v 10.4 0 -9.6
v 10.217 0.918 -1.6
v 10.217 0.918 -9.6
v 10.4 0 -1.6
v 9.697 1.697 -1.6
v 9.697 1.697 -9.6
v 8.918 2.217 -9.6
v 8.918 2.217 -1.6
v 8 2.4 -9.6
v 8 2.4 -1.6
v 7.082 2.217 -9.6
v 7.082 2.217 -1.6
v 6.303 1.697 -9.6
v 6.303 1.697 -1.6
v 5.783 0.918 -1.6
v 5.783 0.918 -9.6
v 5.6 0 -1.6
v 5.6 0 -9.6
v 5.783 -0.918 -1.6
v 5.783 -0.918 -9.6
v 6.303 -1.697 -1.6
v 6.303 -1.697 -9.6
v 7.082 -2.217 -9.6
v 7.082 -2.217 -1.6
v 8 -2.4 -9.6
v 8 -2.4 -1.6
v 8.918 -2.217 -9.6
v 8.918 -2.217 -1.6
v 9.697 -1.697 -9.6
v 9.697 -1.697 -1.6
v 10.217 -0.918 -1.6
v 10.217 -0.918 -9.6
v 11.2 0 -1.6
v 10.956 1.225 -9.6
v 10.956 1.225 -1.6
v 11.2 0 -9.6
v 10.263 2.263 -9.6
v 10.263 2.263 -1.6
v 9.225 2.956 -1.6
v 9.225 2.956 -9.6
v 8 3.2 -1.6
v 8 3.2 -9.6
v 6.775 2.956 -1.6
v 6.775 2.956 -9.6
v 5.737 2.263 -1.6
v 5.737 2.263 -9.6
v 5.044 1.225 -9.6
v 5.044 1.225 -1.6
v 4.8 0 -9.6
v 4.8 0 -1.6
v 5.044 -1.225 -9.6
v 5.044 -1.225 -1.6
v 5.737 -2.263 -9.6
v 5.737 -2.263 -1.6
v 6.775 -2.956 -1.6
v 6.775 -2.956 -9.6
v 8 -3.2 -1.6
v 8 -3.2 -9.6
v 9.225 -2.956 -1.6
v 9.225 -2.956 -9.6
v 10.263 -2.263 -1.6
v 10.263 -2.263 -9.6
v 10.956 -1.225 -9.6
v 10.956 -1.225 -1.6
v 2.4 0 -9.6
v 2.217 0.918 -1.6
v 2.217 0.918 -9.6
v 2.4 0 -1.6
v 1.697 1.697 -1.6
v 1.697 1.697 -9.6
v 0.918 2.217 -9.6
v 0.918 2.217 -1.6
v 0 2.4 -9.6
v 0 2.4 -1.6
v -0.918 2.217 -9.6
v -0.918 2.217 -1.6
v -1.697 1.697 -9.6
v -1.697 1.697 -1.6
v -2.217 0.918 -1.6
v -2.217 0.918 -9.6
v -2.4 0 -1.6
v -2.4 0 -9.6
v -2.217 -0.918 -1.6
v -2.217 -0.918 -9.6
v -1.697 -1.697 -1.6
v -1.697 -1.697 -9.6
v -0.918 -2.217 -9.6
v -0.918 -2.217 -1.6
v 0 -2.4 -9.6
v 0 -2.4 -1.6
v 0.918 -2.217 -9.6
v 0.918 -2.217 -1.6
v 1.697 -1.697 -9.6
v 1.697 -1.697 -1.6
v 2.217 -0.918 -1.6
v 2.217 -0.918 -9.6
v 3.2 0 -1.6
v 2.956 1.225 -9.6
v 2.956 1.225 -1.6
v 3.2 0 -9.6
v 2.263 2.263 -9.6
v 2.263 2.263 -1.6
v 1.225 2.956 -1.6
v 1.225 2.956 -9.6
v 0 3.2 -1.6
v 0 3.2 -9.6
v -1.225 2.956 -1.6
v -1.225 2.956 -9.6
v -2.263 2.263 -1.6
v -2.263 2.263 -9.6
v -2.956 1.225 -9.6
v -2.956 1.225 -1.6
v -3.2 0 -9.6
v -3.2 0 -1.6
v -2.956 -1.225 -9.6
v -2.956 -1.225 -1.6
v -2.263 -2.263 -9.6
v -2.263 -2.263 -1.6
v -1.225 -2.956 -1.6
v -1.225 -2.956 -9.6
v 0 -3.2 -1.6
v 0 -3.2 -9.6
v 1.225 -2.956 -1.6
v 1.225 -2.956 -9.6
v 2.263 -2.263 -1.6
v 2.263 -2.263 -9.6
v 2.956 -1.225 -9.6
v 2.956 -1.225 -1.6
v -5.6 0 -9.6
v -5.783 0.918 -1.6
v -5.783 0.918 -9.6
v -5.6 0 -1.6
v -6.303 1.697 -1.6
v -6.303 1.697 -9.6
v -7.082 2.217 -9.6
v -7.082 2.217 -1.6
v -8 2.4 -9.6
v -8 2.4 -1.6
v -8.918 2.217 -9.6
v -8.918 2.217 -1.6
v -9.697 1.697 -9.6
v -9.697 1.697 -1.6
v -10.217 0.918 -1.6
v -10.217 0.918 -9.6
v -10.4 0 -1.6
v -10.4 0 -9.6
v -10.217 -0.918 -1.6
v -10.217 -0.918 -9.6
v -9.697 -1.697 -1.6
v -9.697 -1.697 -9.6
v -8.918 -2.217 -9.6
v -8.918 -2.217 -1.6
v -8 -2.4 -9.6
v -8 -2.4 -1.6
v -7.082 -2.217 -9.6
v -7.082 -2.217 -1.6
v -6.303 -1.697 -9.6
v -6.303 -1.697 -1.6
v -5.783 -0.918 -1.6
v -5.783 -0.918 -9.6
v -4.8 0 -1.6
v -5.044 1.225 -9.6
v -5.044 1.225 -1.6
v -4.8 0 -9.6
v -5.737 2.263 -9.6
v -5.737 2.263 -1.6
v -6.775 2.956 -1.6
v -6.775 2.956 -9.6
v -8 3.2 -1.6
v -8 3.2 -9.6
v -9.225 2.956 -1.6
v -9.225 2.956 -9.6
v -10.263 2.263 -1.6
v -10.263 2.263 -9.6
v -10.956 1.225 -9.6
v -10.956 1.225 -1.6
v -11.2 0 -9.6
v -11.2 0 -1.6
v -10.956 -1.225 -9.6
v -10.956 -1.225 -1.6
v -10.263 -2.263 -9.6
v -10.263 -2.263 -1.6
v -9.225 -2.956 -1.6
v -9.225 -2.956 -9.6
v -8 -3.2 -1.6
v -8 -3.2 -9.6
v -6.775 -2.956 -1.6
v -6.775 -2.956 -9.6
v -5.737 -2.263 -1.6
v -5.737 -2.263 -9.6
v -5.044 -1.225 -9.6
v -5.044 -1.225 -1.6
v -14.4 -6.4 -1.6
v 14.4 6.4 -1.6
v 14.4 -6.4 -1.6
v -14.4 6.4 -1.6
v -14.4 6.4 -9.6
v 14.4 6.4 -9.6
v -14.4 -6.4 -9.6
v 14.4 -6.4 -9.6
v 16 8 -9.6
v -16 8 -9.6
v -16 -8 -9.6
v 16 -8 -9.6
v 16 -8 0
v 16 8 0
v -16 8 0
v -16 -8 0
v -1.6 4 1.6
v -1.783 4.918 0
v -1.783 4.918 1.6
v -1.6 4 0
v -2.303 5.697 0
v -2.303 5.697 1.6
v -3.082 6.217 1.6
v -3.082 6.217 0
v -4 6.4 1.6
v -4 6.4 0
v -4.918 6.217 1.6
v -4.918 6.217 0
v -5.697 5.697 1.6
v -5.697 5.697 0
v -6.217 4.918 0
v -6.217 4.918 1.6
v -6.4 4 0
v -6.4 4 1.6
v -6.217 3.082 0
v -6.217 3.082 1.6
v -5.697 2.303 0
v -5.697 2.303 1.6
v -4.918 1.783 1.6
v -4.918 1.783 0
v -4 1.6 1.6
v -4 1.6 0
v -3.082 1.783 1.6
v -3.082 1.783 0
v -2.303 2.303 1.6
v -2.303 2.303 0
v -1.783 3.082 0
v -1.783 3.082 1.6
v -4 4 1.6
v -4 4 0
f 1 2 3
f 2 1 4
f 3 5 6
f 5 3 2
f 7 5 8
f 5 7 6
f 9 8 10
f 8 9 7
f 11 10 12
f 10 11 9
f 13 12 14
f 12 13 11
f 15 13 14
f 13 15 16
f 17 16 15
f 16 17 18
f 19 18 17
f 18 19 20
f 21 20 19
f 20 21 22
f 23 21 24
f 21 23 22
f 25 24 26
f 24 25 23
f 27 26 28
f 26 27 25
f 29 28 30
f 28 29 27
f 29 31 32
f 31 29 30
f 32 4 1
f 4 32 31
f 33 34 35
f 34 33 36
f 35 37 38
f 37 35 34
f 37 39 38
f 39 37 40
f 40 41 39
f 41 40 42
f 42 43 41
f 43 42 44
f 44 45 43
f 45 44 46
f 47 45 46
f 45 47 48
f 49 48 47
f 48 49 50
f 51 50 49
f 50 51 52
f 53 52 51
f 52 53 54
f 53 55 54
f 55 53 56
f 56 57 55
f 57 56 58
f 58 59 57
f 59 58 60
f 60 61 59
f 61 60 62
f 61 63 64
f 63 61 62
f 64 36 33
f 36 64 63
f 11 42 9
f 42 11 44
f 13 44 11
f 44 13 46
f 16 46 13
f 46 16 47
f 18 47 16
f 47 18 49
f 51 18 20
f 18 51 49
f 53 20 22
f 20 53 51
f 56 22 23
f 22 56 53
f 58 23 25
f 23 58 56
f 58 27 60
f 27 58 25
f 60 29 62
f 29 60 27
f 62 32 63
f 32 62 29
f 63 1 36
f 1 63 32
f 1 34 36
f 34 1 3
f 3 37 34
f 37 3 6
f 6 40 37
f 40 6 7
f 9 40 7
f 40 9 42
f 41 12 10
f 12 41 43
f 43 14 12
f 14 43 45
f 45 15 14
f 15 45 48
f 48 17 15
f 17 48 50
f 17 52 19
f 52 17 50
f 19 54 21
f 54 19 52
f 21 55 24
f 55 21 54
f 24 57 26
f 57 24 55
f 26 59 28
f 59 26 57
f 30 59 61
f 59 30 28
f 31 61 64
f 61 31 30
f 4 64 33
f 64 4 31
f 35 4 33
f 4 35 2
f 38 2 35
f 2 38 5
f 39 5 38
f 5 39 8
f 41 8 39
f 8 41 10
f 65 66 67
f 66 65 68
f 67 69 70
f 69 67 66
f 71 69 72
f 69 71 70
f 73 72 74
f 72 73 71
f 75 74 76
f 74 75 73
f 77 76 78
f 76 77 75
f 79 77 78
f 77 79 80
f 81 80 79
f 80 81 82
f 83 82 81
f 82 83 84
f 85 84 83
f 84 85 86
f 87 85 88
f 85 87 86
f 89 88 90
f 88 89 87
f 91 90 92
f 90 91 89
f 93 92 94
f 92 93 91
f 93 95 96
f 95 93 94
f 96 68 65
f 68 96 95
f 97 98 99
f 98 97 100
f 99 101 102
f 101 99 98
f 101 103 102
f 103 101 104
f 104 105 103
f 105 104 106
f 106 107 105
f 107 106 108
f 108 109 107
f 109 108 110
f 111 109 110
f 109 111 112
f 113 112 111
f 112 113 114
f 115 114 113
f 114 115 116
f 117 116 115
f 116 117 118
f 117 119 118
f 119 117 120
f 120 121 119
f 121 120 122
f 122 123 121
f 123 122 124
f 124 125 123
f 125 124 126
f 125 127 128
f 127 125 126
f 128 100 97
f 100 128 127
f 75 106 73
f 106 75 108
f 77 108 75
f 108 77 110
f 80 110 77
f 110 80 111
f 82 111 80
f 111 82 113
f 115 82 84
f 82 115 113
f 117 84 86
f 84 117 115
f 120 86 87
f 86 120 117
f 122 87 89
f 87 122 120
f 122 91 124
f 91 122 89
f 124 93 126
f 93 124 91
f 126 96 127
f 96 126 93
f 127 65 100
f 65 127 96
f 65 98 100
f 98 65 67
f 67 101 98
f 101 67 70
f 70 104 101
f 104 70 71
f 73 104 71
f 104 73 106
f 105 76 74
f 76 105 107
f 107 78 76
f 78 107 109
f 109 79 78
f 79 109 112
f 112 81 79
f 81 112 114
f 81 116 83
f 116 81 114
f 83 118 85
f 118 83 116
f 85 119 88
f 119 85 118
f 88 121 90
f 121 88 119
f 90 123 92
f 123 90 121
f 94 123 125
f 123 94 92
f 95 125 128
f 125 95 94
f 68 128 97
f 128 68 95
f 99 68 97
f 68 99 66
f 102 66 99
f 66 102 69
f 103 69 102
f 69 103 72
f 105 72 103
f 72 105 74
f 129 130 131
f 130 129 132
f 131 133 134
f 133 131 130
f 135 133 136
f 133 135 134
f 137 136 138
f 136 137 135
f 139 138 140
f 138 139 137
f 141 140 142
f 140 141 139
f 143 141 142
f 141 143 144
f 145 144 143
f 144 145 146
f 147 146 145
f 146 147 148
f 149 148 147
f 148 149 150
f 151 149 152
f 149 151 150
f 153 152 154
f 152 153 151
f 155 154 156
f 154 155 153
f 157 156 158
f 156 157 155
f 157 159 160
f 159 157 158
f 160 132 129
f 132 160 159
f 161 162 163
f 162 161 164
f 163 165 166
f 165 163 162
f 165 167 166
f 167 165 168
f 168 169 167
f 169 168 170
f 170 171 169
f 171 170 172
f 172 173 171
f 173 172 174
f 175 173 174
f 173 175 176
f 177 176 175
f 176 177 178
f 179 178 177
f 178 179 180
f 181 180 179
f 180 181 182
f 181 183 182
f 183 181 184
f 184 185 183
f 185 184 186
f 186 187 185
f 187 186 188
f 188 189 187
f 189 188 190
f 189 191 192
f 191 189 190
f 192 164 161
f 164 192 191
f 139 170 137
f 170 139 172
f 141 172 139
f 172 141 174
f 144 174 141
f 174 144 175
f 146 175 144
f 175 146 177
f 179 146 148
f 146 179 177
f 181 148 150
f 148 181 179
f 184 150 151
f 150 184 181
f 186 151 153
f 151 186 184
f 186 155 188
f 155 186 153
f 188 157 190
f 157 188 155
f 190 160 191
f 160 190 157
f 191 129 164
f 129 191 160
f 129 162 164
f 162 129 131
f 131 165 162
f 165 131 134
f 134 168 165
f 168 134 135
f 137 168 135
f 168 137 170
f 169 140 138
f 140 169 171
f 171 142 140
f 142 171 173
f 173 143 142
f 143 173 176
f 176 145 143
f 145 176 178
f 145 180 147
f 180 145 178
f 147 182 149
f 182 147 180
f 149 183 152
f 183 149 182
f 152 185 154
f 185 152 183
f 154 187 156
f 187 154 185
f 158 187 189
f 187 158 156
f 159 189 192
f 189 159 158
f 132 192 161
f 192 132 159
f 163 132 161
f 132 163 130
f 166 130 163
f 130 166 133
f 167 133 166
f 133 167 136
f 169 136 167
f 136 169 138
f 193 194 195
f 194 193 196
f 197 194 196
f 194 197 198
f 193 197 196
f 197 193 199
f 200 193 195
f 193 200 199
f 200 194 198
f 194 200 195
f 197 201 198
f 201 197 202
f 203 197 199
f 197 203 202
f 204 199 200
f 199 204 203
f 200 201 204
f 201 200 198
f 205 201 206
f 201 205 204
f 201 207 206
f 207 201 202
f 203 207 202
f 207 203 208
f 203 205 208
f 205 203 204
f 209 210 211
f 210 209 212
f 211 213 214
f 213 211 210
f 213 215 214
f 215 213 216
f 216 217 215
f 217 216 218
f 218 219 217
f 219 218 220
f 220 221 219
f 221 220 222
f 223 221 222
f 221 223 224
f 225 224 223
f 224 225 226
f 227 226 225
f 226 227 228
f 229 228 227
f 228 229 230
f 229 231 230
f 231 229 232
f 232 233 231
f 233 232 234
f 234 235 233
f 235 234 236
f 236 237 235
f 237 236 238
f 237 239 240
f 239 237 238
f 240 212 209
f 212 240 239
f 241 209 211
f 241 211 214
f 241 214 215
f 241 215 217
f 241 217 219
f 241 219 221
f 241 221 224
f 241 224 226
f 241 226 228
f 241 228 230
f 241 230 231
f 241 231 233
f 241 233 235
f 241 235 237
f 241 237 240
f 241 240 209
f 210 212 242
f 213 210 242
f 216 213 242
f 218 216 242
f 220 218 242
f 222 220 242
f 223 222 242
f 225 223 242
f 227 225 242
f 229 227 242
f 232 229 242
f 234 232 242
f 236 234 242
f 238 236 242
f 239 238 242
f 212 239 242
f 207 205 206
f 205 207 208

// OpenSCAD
// file: ../p/4-4ring3.scad
use <../lib.scad>
$fa=1; $fs=0.2;
function ldraw_lib__4_4ring3(realsolid=false) = [
// 0 Ring  3 x 1.0
// 0 Name: 4-4ring3.dat
// 0 Author: James Jessiman
// 0 !LDRAW_ORG Primitive UPDATE 2009-01
// 0 !LICENSE Licensed under CC BY 2.0 and CC BY 4.0 : see CAreadme.txt
// 
// 0 BFC CERTIFY CCW
  [0,"BFC","CERTIFY"],
  [0,"BFC","CCW"],
// 
// 0 !HISTORY 1998-12-15 [PTadmin] Official Update 1998-10
// 0 !HISTORY 2002-04-05 [hafhead] Added BFC statement
// 0 !HISTORY 2002-04-25 [PTadmin] Official Update 2002-02
// 0 !HISTORY 2007-06-24 [PTadmin] Header formatted for Contributor Agreement
// 0 !HISTORY 2008-07-01 [PTadmin] Official Update 2008-01
// 0 !HISTORY 2008-08-26 [cwdee] Switch polygon winding and rename
// 0 !HISTORY 2009-05-02 [PTadmin] Official Update 2009-01
// 
// 
// 4 16 -1.5308 0 3.6956 -1.1481 0 2.7717 0 0 3 0 0 4
  [4,16,-1.5308,0,3.6956,-1.1481,0,2.7717,0,0,3,0,0,4],
// 4 16 -2.8284 0 2.8284 -2.1213 0 2.1213 -1.1481 0 2.7717 -1.5308 0 3.6956
  [4,16,-2.8284,0,2.8284,-2.1213,0,2.1213,-1.1481,0,2.7717,-1.5308,0,3.6956],
// 4 16 -3.6956 0 1.5308 -2.7717 0 1.1481 -2.1213 0 2.1213 -2.8284 0 2.8284
  [4,16,-3.6956,0,1.5308,-2.7717,0,1.1481,-2.1213,0,2.1213,-2.8284,0,2.8284],
// 4 16 -4 0 0 -3 0 0 -2.7717 0 1.1481 -3.6956 0 1.5308
  [4,16,-4,0,0,-3,0,0,-2.7717,0,1.1481,-3.6956,0,1.5308],
// 4 16 -3.6956 0 -1.5308 -2.7717 0 -1.1481 -3 0 0 -4 0 0
  [4,16,-3.6956,0,-1.5308,-2.7717,0,-1.1481,-3,0,0,-4,0,0],
// 4 16 -2.8284 0 -2.8284 -2.1213 0 -2.1213 -2.7717 0 -1.1481 -3.6956 0 -1.5308
  [4,16,-2.8284,0,-2.8284,-2.1213,0,-2.1213,-2.7717,0,-1.1481,-3.6956,0,-1.5308],
// 4 16 -1.5308 0 -3.6956 -1.1481 0 -2.7717 -2.1213 0 -2.1213 -2.8284 0 -2.8284
  [4,16,-1.5308,0,-3.6956,-1.1481,0,-2.7717,-2.1213,0,-2.1213,-2.8284,0,-2.8284],
// 4 16 0 0 -4 0 0 -3 -1.1481 0 -2.7717 -1.5308 0 -3.6956
  [4,16,0,0,-4,0,0,-3,-1.1481,0,-2.7717,-1.5308,0,-3.6956],
// 4 16 1.5308 0 -3.6956 1.1481 0 -2.7717 0 0 -3 0 0 -4
  [4,16,1.5308,0,-3.6956,1.1481,0,-2.7717,0,0,-3,0,0,-4],
// 4 16 2.8284 0 -2.8284 2.1213 0 -2.1213 1.1481 0 -2.7717 1.5308 0 -3.6956
  [4,16,2.8284,0,-2.8284,2.1213,0,-2.1213,1.1481,0,-2.7717,1.5308,0,-3.6956],
// 4 16 3.6956 0 -1.5308 2.7717 0 -1.1481 2.1213 0 -2.1213 2.8284 0 -2.8284
  [4,16,3.6956,0,-1.5308,2.7717,0,-1.1481,2.1213,0,-2.1213,2.8284,0,-2.8284],
// 4 16 4 0 0 3 0 0 2.7717 0 -1.1481 3.6956 0 -1.5308
  [4,16,4,0,0,3,0,0,2.7717,0,-1.1481,3.6956,0,-1.5308],
// 4 16 3.6956 0 1.5308 2.7717 0 1.1481 3 0 0 4 0 0
  [4,16,3.6956,0,1.5308,2.7717,0,1.1481,3,0,0,4,0,0],
// 4 16 2.8284 0 2.8284 2.1213 0 2.1213 2.7717 0 1.1481 3.6956 0 1.5308
  [4,16,2.8284,0,2.8284,2.1213,0,2.1213,2.7717,0,1.1481,3.6956,0,1.5308],
// 4 16 1.5308 0 3.6956 1.1481 0 2.7717 2.1213 0 2.1213 2.8284 0 2.8284
  [4,16,1.5308,0,3.6956,1.1481,0,2.7717,2.1213,0,2.1213,2.8284,0,2.8284],
// 4 16 0 0 4 0 0 3 1.1481 0 2.7717 1.5308 0 3.6956
  [4,16,0,0,4,0,0,3,1.1481,0,2.7717,1.5308,0,3.6956],
// 0
];
module ldraw_lib__4_4ring3(step=0, col=false, unit=2/5, alt=false, line=0.2, solid=!$preview)
    makepoly(ldraw_lib__4_4ring3(solid), step=step, col=col, unit=unit, alt=alt, line=line, solid=solid);
ldraw_lib__4_4ring3(line=0.2);
// file: ../p/4-4edge.scad
use <../lib.scad>
function ldraw_lib__4_4edge() = [
// 0 Circle 1.0
// 0 Name: 4-4edge.dat
// 0 Author: James Jessiman
// 0 !LDRAW_ORG Primitive UPDATE 2017-01
// 0 !LICENSE Licensed under CC BY 2.0 and CC BY 4.0 : see CAreadme.txt
// 
// 0 BFC CERTIFY CCW
  [0,"BFC","CERTIFY"],
  [0,"BFC","CCW"],
// 
// 0 !HISTORY 1998-12-15 [PTadmin] Official Update 1998-10
// 0 !HISTORY 2005-12-28 [PTadmin] Official Update 2005-01
// 0 !HISTORY 2007-06-24 [PTadmin] Header formatted for Contributor Agreement
// 0 !HISTORY 2008-07-01 [PTadmin] Official Update 2008-01
// 0 !HISTORY 2017-01-15 [Steffen] BFCed
// 0 !HISTORY 2017-12-30 [PTadmin] Official Update 2017-01
// 
// 
// 2 24 1 0 0 0.9239 0 0.3827
  [2,24,1,0,0,0.9239,0,0.3827],
// 2 24 0.9239 0 0.3827 0.7071 0 0.7071
  [2,24,0.9239,0,0.3827,0.7071,0,0.7071],
// 2 24 0.7071 0 0.7071 0.3827 0 0.9239
  [2,24,0.7071,0,0.7071,0.3827,0,0.9239],
// 2 24 0.3827 0 0.9239 0 0 1
  [2,24,0.3827,0,0.9239,0,0,1],
// 2 24 0 0 1 -0.3827 0 0.9239
  [2,24,0,0,1,-0.3827,0,0.9239],
// 2 24 -0.3827 0 0.9239 -0.7071 0 0.7071
  [2,24,-0.3827,0,0.9239,-0.7071,0,0.7071],
// 2 24 -0.7071 0 0.7071 -0.9239 0 0.3827
  [2,24,-0.7071,0,0.7071,-0.9239,0,0.3827],
// 2 24 -0.9239 0 0.3827 -1 0 -0
  [2,24,-0.9239,0,0.3827,-1,0,-0],
// 2 24 -1 0 -0 -0.9239 0 -0.3827
  [2,24,-1,0,-0,-0.9239,0,-0.3827],
// 2 24 -0.9239 0 -0.3827 -0.7071 0 -0.7071
  [2,24,-0.9239,0,-0.3827,-0.7071,0,-0.7071],
// 2 24 -0.7071 0 -0.7071 -0.3827 0 -0.9239
  [2,24,-0.7071,0,-0.7071,-0.3827,0,-0.9239],
// 2 24 -0.3827 0 -0.9239 0 0 -1
  [2,24,-0.3827,0,-0.9239,0,0,-1],
// 2 24 0 0 -1 0.3827 0 -0.9239
  [2,24,0,0,-1,0.3827,0,-0.9239],
// 2 24 0.3827 0 -0.9239 0.7071 0 -0.7071
  [2,24,0.3827,0,-0.9239,0.7071,0,-0.7071],
// 2 24 0.7071 0 -0.7071 0.9239 0 -0.3827
  [2,24,0.7071,0,-0.7071,0.9239,0,-0.3827],
// 2 24 0.9239 0 -0.3827 1 0 0
  [2,24,0.9239,0,-0.3827,1,0,0],
];
module ldraw_lib__4_4edge(step=0, col=false, unit=2/5, alt=false, line=0.2, solid=!$preview)
    makepoly(ldraw_lib__4_4edge(), step=step, col=col, unit=unit, alt=alt, line=line, solid=solid);
ldraw_lib__4_4edge(line=0.2);
// file: ../p/4-4disc.scad
use <../lib.scad>
function ldraw_lib__4_4disc() = [
// 0 Disc 1.0
// 0 Name: 4-4disc.dat
// 0 Author: James Jessiman
// 0 !LDRAW_ORG Primitive UPDATE 2002-02
// 0 !LICENSE Licensed under CC BY 2.0 and CC BY 4.0 : see CAreadme.txt
// 
// 0 BFC CERTIFY CCW
  [0,"BFC","CERTIFY"],
  [0,"BFC","CCW"],
// 
// 0 !HISTORY 1998-12-15 [PTadmin] Official Update 1998-10
// 0 !HISTORY 2002-03-23 [sbliss] Added BFC statement
// 0 !HISTORY 2002-04-25 [PTadmin] Official Update 2002-02
// 0 !HISTORY 2007-06-24 [PTadmin] Header formatted for Contributor Agreement
// 0 !HISTORY 2008-07-01 [PTadmin] Official Update 2008-01
// 
// 
// 3 16 0 0 0 1 0 0 0.9239 0 0.3827
  [3,16,0,0,0,1,0,0,0.9239,0,0.3827],
// 3 16 0 0 0 0.9239 0 0.3827 0.7071 0 0.7071
  [3,16,0,0,0,0.9239,0,0.3827,0.7071,0,0.7071],
// 3 16 0 0 0 0.7071 0 0.7071 0.3827 0 0.9239
  [3,16,0,0,0,0.7071,0,0.7071,0.3827,0,0.9239],
// 3 16 0 0 0 0.3827 0 0.9239 0 0 1
  [3,16,0,0,0,0.3827,0,0.9239,0,0,1],
// 3 16 0 0 0 0 0 1 -0.3827 0 0.9239
  [3,16,0,0,0,0,0,1,-0.3827,0,0.9239],
// 3 16 0 0 0 -0.3827 0 0.9239 -0.7071 0 0.7071
  [3,16,0,0,0,-0.3827,0,0.9239,-0.7071,0,0.7071],
// 3 16 0 0 0 -0.7071 0 0.7071 -0.9239 0 0.3827
  [3,16,0,0,0,-0.7071,0,0.7071,-0.9239,0,0.3827],
// 3 16 0 0 0 -0.9239 0 0.3827 -1 0 -0
  [3,16,0,0,0,-0.9239,0,0.3827,-1,0,-0],
// 3 16 0 0 0 -1 0 -0 -0.9239 0 -0.3827
  [3,16,0,0,0,-1,0,-0,-0.9239,0,-0.3827],
// 3 16 0 0 0 -0.9239 0 -0.3827 -0.7071 0 -0.7071
  [3,16,0,0,0,-0.9239,0,-0.3827,-0.7071,0,-0.7071],
// 3 16 0 0 0 -0.7071 0 -0.7071 -0.3827 0 -0.9239
  [3,16,0,0,0,-0.7071,0,-0.7071,-0.3827,0,-0.9239],
// 3 16 0 0 0 -0.3827 0 -0.9239 0 0 -1
  [3,16,0,0,0,-0.3827,0,-0.9239,0,0,-1],
// 3 16 0 0 0 0 0 -1 0.3827 0 -0.9239
  [3,16,0,0,0,0,0,-1,0.3827,0,-0.9239],
// 3 16 0 0 0 0.3827 0 -0.9239 0.7071 0 -0.7071
  [3,16,0,0,0,0.3827,0,-0.9239,0.7071,0,-0.7071],
// 3 16 0 0 0 0.7071 0 -0.7071 0.9239 0 -0.3827
  [3,16,0,0,0,0.7071,0,-0.7071,0.9239,0,-0.3827],
// 3 16 0 0 0 0.9239 0 -0.3827 1 0 0
  [3,16,0,0,0,0.9239,0,-0.3827,1,0,0],
// 0
];
module ldraw_lib__4_4disc(step=0, col=false, unit=2/5, alt=false, line=0.2, solid=!$preview)
    makepoly(ldraw_lib__4_4disc(), step=step, col=col, unit=unit, alt=alt, line=line, solid=solid);
ldraw_lib__4_4disc(line=0.2);
// file: ../p/4-4cyli.scad
use <../lib.scad>
$fa=1; $fs=0.2;
function ldraw_lib__4_4cyli(realsolid=false) = [
// 0 Cylinder 1.0
// 0 Name: 4-4cyli.dat
// 0 Author: James Jessiman
// 0 !LDRAW_ORG Primitive UPDATE 2005-01
// 0 !LICENSE Licensed under CC BY 2.0 and CC BY 4.0 : see CAreadme.txt
// 
// 0 BFC CERTIFY CCW
  [0,"BFC","CERTIFY"],
  [0,"BFC","CCW"],
// 
// 0 !HISTORY 1998-12-15 [PTadmin] Official Update 1998-10
// 0 !HISTORY 2002-03-23 [sbliss] Added BFC statement; merged headers from files in distributions LDraw 0.27 and Complete.
// 0 !HISTORY 2002-04-25 [PTadmin] Official Update 2002-02
// 0 !HISTORY 2004-12-14 [guyvivan] BFC CCW
// 0 !HISTORY 2005-12-28 [PTadmin] Official Update 2005-01
// 0 !HISTORY 2007-06-24 [PTadmin] Header formatted for Contributor Agreement
// 0 !HISTORY 2008-07-01 [PTadmin] Official Update 2008-01
// 
// 
// 4 16 1 1 0 0.9239 1 0.3827 0.9239 0 0.3827 1 0 0
  [4,16,1,1,0,0.9239,1,0.3827,0.9239,0,0.3827,1,0,0],
// 5 24 1 0 0 1 1 0 0.9239 0 0.3827 0.9239 0 -0.3827
  [5,24,1,0,0,1,1,0,0.9239,0,0.3827,0.9239,0,-0.3827],
// 4 16 0.9239 1 0.3827 0.7071 1 0.7071 0.7071 0 0.7071 0.9239 0 0.3827
  [4,16,0.9239,1,0.3827,0.7071,1,0.7071,0.7071,0,0.7071,0.9239,0,0.3827],
// 5 24 0.9239 0 0.3827 0.9239 1 0.3827 0.7071 0 0.7071 1 0 0
  [5,24,0.9239,0,0.3827,0.9239,1,0.3827,0.7071,0,0.7071,1,0,0],
// 4 16 0.7071 1 0.7071 0.3827 1 0.9239 0.3827 0 0.9239 0.7071 0 0.7071
  [4,16,0.7071,1,0.7071,0.3827,1,0.9239,0.3827,0,0.9239,0.7071,0,0.7071],
// 5 24 0.7071 0 0.7071 0.7071 1 0.7071 0.3827 0 0.9239 0.9239 0 0.3827
  [5,24,0.7071,0,0.7071,0.7071,1,0.7071,0.3827,0,0.9239,0.9239,0,0.3827],
// 4 16 0.3827 1 0.9239 0 1 1 0 0 1 0.3827 0 0.9239
  [4,16,0.3827,1,0.9239,0,1,1,0,0,1,0.3827,0,0.9239],
// 5 24 0.3827 0 0.9239 0.3827 1 0.9239 0 0 1 0.7071 0 0.7071
  [5,24,0.3827,0,0.9239,0.3827,1,0.9239,0,0,1,0.7071,0,0.7071],
// 4 16 0 1 1 -0.3827 1 0.9239 -0.3827 0 0.9239 0 0 1
  [4,16,0,1,1,-0.3827,1,0.9239,-0.3827,0,0.9239,0,0,1],
// 5 24 0 0 1 0 1 1 -0.3827 0 0.9239 0.3827 0 0.9239
  [5,24,0,0,1,0,1,1,-0.3827,0,0.9239,0.3827,0,0.9239],
// 4 16 -0.3827 1 0.9239 -0.7071 1 0.7071 -0.7071 0 0.7071 -0.3827 0 0.9239
  [4,16,-0.3827,1,0.9239,-0.7071,1,0.7071,-0.7071,0,0.7071,-0.3827,0,0.9239],
// 5 24 -0.3827 0 0.9239 -0.3827 1 0.9239 -0.7071 0 0.7071 0 0 1
  [5,24,-0.3827,0,0.9239,-0.3827,1,0.9239,-0.7071,0,0.7071,0,0,1],
// 4 16 -0.7071 1 0.7071 -0.9239 1 0.3827 -0.9239 0 0.3827 -0.7071 0 0.7071
  [4,16,-0.7071,1,0.7071,-0.9239,1,0.3827,-0.9239,0,0.3827,-0.7071,0,0.7071],
// 5 24 -0.7071 0 0.7071 -0.7071 1 0.7071 -0.9239 0 0.3827 -0.3827 0 0.9239
  [5,24,-0.7071,0,0.7071,-0.7071,1,0.7071,-0.9239,0,0.3827,-0.3827,0,0.9239],
// 4 16 -0.9239 1 0.3827 -1 1 0 -1 0 0 -0.9239 0 0.3827
  [4,16,-0.9239,1,0.3827,-1,1,0,-1,0,0,-0.9239,0,0.3827],
// 5 24 -0.9239 0 0.3827 -0.9239 1 0.3827 -1 0 0 -0.7071 0 0.7071
  [5,24,-0.9239,0,0.3827,-0.9239,1,0.3827,-1,0,0,-0.7071,0,0.7071],
// 4 16 -1 1 0 -0.9239 1 -0.3827 -0.9239 0 -0.3827 -1 0 0
  [4,16,-1,1,0,-0.9239,1,-0.3827,-0.9239,0,-0.3827,-1,0,0],
// 5 24 -1 0 0 -1 1 0 -0.9239 0 -0.3827 -0.9239 0 0.3827
  [5,24,-1,0,0,-1,1,0,-0.9239,0,-0.3827,-0.9239,0,0.3827],
// 4 16 -0.9239 1 -0.3827 -0.7071 1 -0.7071 -0.7071 0 -0.7071 -0.9239 0 -0.3827
  [4,16,-0.9239,1,-0.3827,-0.7071,1,-0.7071,-0.7071,0,-0.7071,-0.9239,0,-0.3827],
// 5 24 -0.9239 0 -0.3827 -0.9239 1 -0.3827 -0.7071 0 -0.7071 -1 0 0
  [5,24,-0.9239,0,-0.3827,-0.9239,1,-0.3827,-0.7071,0,-0.7071,-1,0,0],
// 4 16 -0.7071 1 -0.7071 -0.3827 1 -0.9239 -0.3827 0 -0.9239 -0.7071 0 -0.7071
  [4,16,-0.7071,1,-0.7071,-0.3827,1,-0.9239,-0.3827,0,-0.9239,-0.7071,0,-0.7071],
// 5 24 -0.7071 0 -0.7071 -0.7071 1 -0.7071 -0.3827 0 -0.9239 -0.9239 0 -0.3827
  [5,24,-0.7071,0,-0.7071,-0.7071,1,-0.7071,-0.3827,0,-0.9239,-0.9239,0,-0.3827],
// 4 16 -0.3827 1 -0.9239 0 1 -1 0 0 -1 -0.3827 0 -0.9239
  [4,16,-0.3827,1,-0.9239,0,1,-1,0,0,-1,-0.3827,0,-0.9239],
// 5 24 -0.3827 0 -0.9239 -0.3827 1 -0.9239 0 0 -1 -0.7071 0 -0.7071
  [5,24,-0.3827,0,-0.9239,-0.3827,1,-0.9239,0,0,-1,-0.7071,0,-0.7071],
// 4 16 0 1 -1 0.3827 1 -0.9239 0.3827 0 -0.9239 0 0 -1
  [4,16,0,1,-1,0.3827,1,-0.9239,0.3827,0,-0.9239,0,0,-1],
// 5 24 0 0 -1 0 1 -1 0.3827 0 -0.9239 -0.3827 0 -0.9239
  [5,24,0,0,-1,0,1,-1,0.3827,0,-0.9239,-0.3827,0,-0.9239],
// 4 16 0.3827 1 -0.9239 0.7071 1 -0.7071 0.7071 0 -0.7071 0.3827 0 -0.9239
  [4,16,0.3827,1,-0.9239,0.7071,1,-0.7071,0.7071,0,-0.7071,0.3827,0,-0.9239],
// 5 24 0.3827 0 -0.9239 0.3827 1 -0.9239 0.7071 0 -0.7071 0 0 -1
  [5,24,0.3827,0,-0.9239,0.3827,1,-0.9239,0.7071,0,-0.7071,0,0,-1],
// 4 16 0.7071 1 -0.7071 0.9239 1 -0.3827 0.9239 0 -0.3827 0.7071 0 -0.7071
  [4,16,0.7071,1,-0.7071,0.9239,1,-0.3827,0.9239,0,-0.3827,0.7071,0,-0.7071],
// 5 24 0.7071 0 -0.7071 0.7071 1 -0.7071 0.9239 0 -0.3827 0.3827 0 -0.9239
  [5,24,0.7071,0,-0.7071,0.7071,1,-0.7071,0.9239,0,-0.3827,0.3827,0,-0.9239],
// 4 16 0.9239 1 -0.3827 1 1 0 1 0 0 0.9239 0 -0.3827
  [4,16,0.9239,1,-0.3827,1,1,0,1,0,0,0.9239,0,-0.3827],
// 5 24 0.9239 0 -0.3827 0.9239 1 -0.3827 1 0 0 0.7071 0 -0.7071
  [5,24,0.9239,0,-0.3827,0.9239,1,-0.3827,1,0,0,0.7071,0,-0.7071],
// 0
];
module ldraw_lib__4_4cyli(step=0, col=false, unit=2/5, alt=false, line=0.2, solid=!$preview)
    makepoly(ldraw_lib__4_4cyli(solid), step=step, col=col, unit=unit, alt=alt, line=line, solid=solid);
ldraw_lib__4_4cyli(line=0.2);
// file: ../p/stud4.scad
use <../lib.scad>
use <4-4cyli.scad>
use <4-4edge.scad>
use <4-4ring3.scad>
function ldraw_lib__stud4() = [
// 0 Stud Tube Open
// 0 Name: stud4.dat
// 0 Author: James Jessiman
// 0 !LDRAW_ORG Primitive UPDATE 2009-02
// 0 !LICENSE Licensed under CC BY 4.0 : see CAreadme.txt
// 
// 0 BFC CERTIFY CCW
  [0,"BFC","CERTIFY"],
  [0,"BFC","CCW"],
// 
// 0 !HISTORY 1999-07-05 [PTadmin] Official Update 1999-05
// 0 !HISTORY 2002-04-04 [sbliss] Modified for BFC compliance
// 0 !HISTORY 2002-04-25 [PTadmin] Official Update 2002-02
// 0 !HISTORY 2007-06-24 [PTadmin] Header formatted for Contributor Agreement
// 0 !HISTORY 2008-07-01 [PTadmin] Official Update 2008-01
// 0 !HISTORY 2009-06-21 [cwdee] Update ring references to 4-4ring
// 0 !HISTORY 2009-09-03 [PTadmin] Official Update 2009-02
// 
// 
// 1 16 0 -4 0 6 0 0 0 1 0 0 0 6 4-4edge.dat
  [1,16,0,-4,0,6,0,0,0,1,0,0,0,6, ldraw_lib__4_4edge()],
// 1 16 0 -4 0 8 0 0 0 1 0 0 0 8 4-4edge.dat
  [1,16,0,-4,0,8,0,0,0,1,0,0,0,8, ldraw_lib__4_4edge()],
// 1 16 0 0 0 6 0 0 0 1 0 0 0 6 4-4edge.dat
  [1,16,0,0,0,6,0,0,0,1,0,0,0,6, ldraw_lib__4_4edge()],
// 1 16 0 0 0 8 0 0 0 1 0 0 0 8 4-4edge.dat
  [1,16,0,0,0,8,0,0,0,1,0,0,0,8, ldraw_lib__4_4edge()],
// 0 BFC INVERTNEXT
  [0,"BFC","INVERTNEXT"],
// 1 16 0 -4 0 6 0 0 0 4 0 0 0 6 4-4cyli.dat
  [1,16,0,-4,0,6,0,0,0,4,0,0,0,6, ldraw_lib__4_4cyli()],
// 1 16 0 -4 0 8 0 0 0 4 0 0 0 8 4-4cyli.dat
  [1,16,0,-4,0,8,0,0,0,4,0,0,0,8, ldraw_lib__4_4cyli()],
// 1 16 0 -4 0 2 0 0 0 1 0 0 0 2 4-4ring3.dat
  [1,16,0,-4,0,2,0,0,0,1,0,0,0,2, ldraw_lib__4_4ring3()],
  [-1,16,0,0,0,2,0,0,0,-1,0,0,0,2, ldraw_lib__4_4ring3()],
// 0
];
module ldraw_lib__stud4(step=0, col=false, unit=2/5, alt=false, line=0.2, solid=!$preview)
    makepoly(ldraw_lib__stud4(), step=step, col=col, unit=unit, alt=alt, line=line, solid=solid);
ldraw_lib__stud4(line=0.2);
// file: ../p/box5.scad
use <../lib.scad>
function ldraw_lib__box5() = [
// 0 Box with 5 Faces and All Edges
// 0 Name: box5.dat
// 0 Author: James Jessiman
// 0 !LDRAW_ORG Primitive UPDATE 2012-01
// 0 !LICENSE Licensed under CC BY 2.0 and CC BY 4.0 : see CAreadme.txt
// 
// 0 BFC CERTIFY CCW
  [0,"BFC","CERTIFY"],
  [0,"BFC","CCW"],
// 
// 0 !HISTORY 2002-04-03 [sbliss] Modified for BFC compliance
// 0 !HISTORY 2002-04-25 [PTadmin] Official Update 2002-02
// 0 !HISTORY 2007-06-24 [PTadmin] Header formatted for Contributor Agreement
// 0 !HISTORY 2008-07-01 [PTadmin] Official Update 2008-01
// 0 !HISTORY 2012-02-16 [Philo] Changed to CCW
// 0 !HISTORY 2012-03-30 [PTadmin] Official Update 2012-01
// 
// 
// 2 24 1 1 1 -1 1 1
  [2,24,1,1,1,-1,1,1],
// 2 24 -1 1 1 -1 1 -1
  [2,24,-1,1,1,-1,1,-1],
// 2 24 -1 1 -1 1 1 -1
  [2,24,-1,1,-1,1,1,-1],
// 2 24 1 1 -1 1 1 1
  [2,24,1,1,-1,1,1,1],
// 2 24 1 0 1 -1 0 1
  [2,24,1,0,1,-1,0,1],
// 2 24 -1 0 1 -1 0 -1
  [2,24,-1,0,1,-1,0,-1],
// 2 24 -1 0 -1 1 0 -1
  [2,24,-1,0,-1,1,0,-1],
// 2 24 1 0 -1 1 0 1
  [2,24,1,0,-1,1,0,1],
// 2 24 1 0 1 1 1 1
  [2,24,1,0,1,1,1,1],
// 2 24 -1 0 1 -1 1 1
  [2,24,-1,0,1,-1,1,1],
// 2 24 1 0 -1 1 1 -1
  [2,24,1,0,-1,1,1,-1],
// 2 24 -1 0 -1 -1 1 -1
  [2,24,-1,0,-1,-1,1,-1],
// 4 16 -1 1 1 1 1 1 1 1 -1 -1 1 -1
  [4,16,-1,1,1,1,1,1,1,1,-1,-1,1,-1],
// 4 16 -1 1 1 -1 0 1 1 0 1 1 1 1
  [4,16,-1,1,1,-1,0,1,1,0,1,1,1,1],
// 4 16 -1 1 -1 -1 0 -1 -1 0 1 -1 1 1
  [4,16,-1,1,-1,-1,0,-1,-1,0,1,-1,1,1],
// 4 16 1 1 -1 1 0 -1 -1 0 -1 -1 1 -1
  [4,16,1,1,-1,1,0,-1,-1,0,-1,-1,1,-1],
// 4 16 1 1 1 1 0 1 1 0 -1 1 1 -1
  [4,16,1,1,1,1,0,1,1,0,-1,1,1,-1],
];
makepoly(ldraw_lib__box5(), line=0.2);
// file: ../p/box4.scad
use <../lib.scad>
function ldraw_lib__box4() = [
// 0 Box with 4 Faces (2 Parallel Pairs) and All Edges
// 0 Name: box4.dat
// 0 Author: James Jessiman
// 0 !LDRAW_ORG Primitive UPDATE 2012-01
// 0 !LICENSE Licensed under CC BY 4.0 : see CAreadme.txt
// 
// 0 BFC CERTIFY CCW
  [0,"BFC","CERTIFY"],
  [0,"BFC","CCW"],
// 
// 0 !HISTORY 2002-04-03 [sbliss] Modified for BFC compliance
// 0 !HISTORY 2002-04-25 [PTadmin] Official Update 2002-02
// 0 !HISTORY 2007-06-24 [PTadmin] Header formatted for Contributor Agreement
// 0 !HISTORY 2008-07-01 [PTadmin] Official Update 2008-01
// 0 !HISTORY 2012-02-16 [Philo] Changed to CCW
// 0 !HISTORY 2012-03-30 [PTadmin] Official Update 2012-01
// 
// 
// 2 24 1 1 1 -1 1 1
  [2,24,1,1,1,-1,1,1],
// 2 24 -1 1 1 -1 1 -1
  [2,24,-1,1,1,-1,1,-1],
// 2 24 -1 1 -1 1 1 -1
  [2,24,-1,1,-1,1,1,-1],
// 2 24 1 1 -1 1 1 1
  [2,24,1,1,-1,1,1,1],
// 2 24 1 0 1 -1 0 1
  [2,24,1,0,1,-1,0,1],
// 2 24 -1 0 1 -1 0 -1
  [2,24,-1,0,1,-1,0,-1],
// 2 24 -1 0 -1 1 0 -1
  [2,24,-1,0,-1,1,0,-1],
// 2 24 1 0 -1 1 0 1
  [2,24,1,0,-1,1,0,1],
// 2 24 1 0 1 1 1 1
  [2,24,1,0,1,1,1,1],
// 2 24 -1 0 1 -1 1 1
  [2,24,-1,0,1,-1,1,1],
// 2 24 1 0 -1 1 1 -1
  [2,24,1,0,-1,1,1,-1],
// 2 24 -1 0 -1 -1 1 -1
  [2,24,-1,0,-1,-1,1,-1],
// 4 16 -1 1 1 -1 0 1 1 0 1 1 1 1
  [4,16,-1,1,1,-1,0,1,1,0,1,1,1,1],
// 4 16 -1 1 -1 -1 0 -1 -1 0 1 -1 1 1
  [4,16,-1,1,-1,-1,0,-1,-1,0,1,-1,1,1],
// 4 16 1 1 -1 1 0 -1 -1 0 -1 -1 1 -1
  [4,16,1,1,-1,1,0,-1,-1,0,-1,-1,1,-1],
// 4 16 1 1 1 1 0 1 1 0 -1 1 1 -1
  [4,16,1,1,1,1,0,1,1,0,-1,1,1,-1],
];
module ldraw_lib__box4(step=0, col=false, unit=2/5, alt=false, line=0.2, solid=!$preview)
    makepoly(ldraw_lib__box4(), step=step, col=col, unit=unit, alt=alt, line=line, solid=solid);
ldraw_lib__box4(line=0.2);
// file: ../p/stud.scad
use <../lib.scad>
use <4-4cyli.scad>
use <4-4disc.scad>
use <4-4edge.scad>
function ldraw_lib__stud() = [
// 0 Stud
// 0 Name: stud.dat
// 0 Author: James Jessiman
// 0 !LDRAW_ORG Primitive UPDATE 2012-01
// 0 !LICENSE Licensed under CC BY 4.0 : see CAreadme.txt
// 
// 0 BFC CERTIFY CCW
  [0,"BFC","CERTIFY"],
  [0,"BFC","CCW"],
// 
// 0 !HISTORY 2002-04-04 [sbliss] Modified for BFC compliance
// 0 !HISTORY 2002-04-25 [PTadmin] Official Update 2002-02
// 0 !HISTORY 2007-06-24 [PTadmin] Header formatted for Contributor Agreement
// 0 !HISTORY 2008-07-01 [PTadmin] Official Update 2008-01
// 0 !HISTORY 2012-02-16 [Philo] Changed to CCW
// 0 !HISTORY 2012-03-30 [PTadmin] Official Update 2012-01
// 
// 
// 1 16 0 0 0 6 0 0 0 1 0 0 0 6 4-4edge.dat
  [1,16,0,0,0,6,0,0,0,1,0,0,0,6, ldraw_lib__4_4edge()],
// 1 16 0 -4 0 6 0 0 0 1 0 0 0 6 4-4edge.dat
  [1,16,0,-4,0,6,0,0,0,1,0,0,0,6, ldraw_lib__4_4edge()],
// 1 16 0 0 0 6 0 0 0 -4 0 0 0 6 4-4cyli.dat
  [1,16,0,0,0,6,0,0,0,-4,0,0,0,6, ldraw_lib__4_4cyli()],
// 1 16 0 -4 0 6 0 0 0 1 0 0 0 6 4-4disc.dat
  [1,16,0,-4,0,6,0,0,0,1,0,0,0,6, ldraw_lib__4_4disc()],
  [-1,16,0,0,0,6,0,0,0,-1,0,0,0,6, ldraw_lib__4_4disc()],
];
module ldraw_lib__stud(step=0, col=false, unit=2/5, alt=false, line=0.2, solid=!$preview)
    makepoly(ldraw_lib__stud(), step=step, col=col, unit=unit, alt=alt, line=line, solid=solid);
ldraw_lib__stud(line=0.2);
// file: s/3001s02.scad
use <../../lib.scad>
use <../../p/box4.scad>
use <../../p/box5.scad>
use <../../p/stud4.scad>
function ldraw_lib__s__3001s02() = [
// 0 ~Brick  2 x  4 without Top and Top Studs
// 0 Name: s\3001s02.dat
// 0 Author: Rene Rechthaler [Blechtaler]
// 0 !LDRAW_ORG Subpart UPDATE 2024-09
// 0 !LICENSE Licensed under CC BY 4.0 : see CAreadme.txt
// 
// 0 BFC CERTIFY CCW
  [0,"BFC","CERTIFY"],
  [0,"BFC","CCW"],
// 
// 0 !HISTORY 2023-11-20 [Blechtaler] made from 3001s01
// 0 !HISTORY 2024-10-27 [OrionP] Official Update 2024-09
// 
// 1 16 20 4 0 1 0 0 0 -5 0 0 0 1 stud4.dat
  [1,16,20,4,0,1,0,0,0,-5,0,0,0,1, ldraw_lib__stud4()],
// 1 16 0 4 0 1 0 0 0 -5 0 0 0 1 stud4.dat
  [1,16,0,4,0,1,0,0,0,-5,0,0,0,1, ldraw_lib__stud4()],
// 1 16 -20 4 0 1 0 0 0 -5 0 0 0 1 stud4.dat
  [1,16,-20,4,0,1,0,0,0,-5,0,0,0,1, ldraw_lib__stud4()],
// 0 BFC INVERTNEXT
  [0,"BFC","INVERTNEXT"],
// 1 16 0 24 0 36 0 0 0 -20 0 0 0 16 box5.dat
  [1,16,0,24,0,36,0,0,0,-20,0,0,0,16, ldraw_lib__box5()],
// 4 16 40 24 20 36 24 16 -36 24 16 -40 24 20
  [4,16,40,24,20,36,24,16,-36,24,16,-40,24,20],
// 4 16 -40 24 20 -36 24 16 -36 24 -16 -40 24 -20
  [4,16,-40,24,20,-36,24,16,-36,24,-16,-40,24,-20],
// 4 16 -40 24 -20 -36 24 -16 36 24 -16 40 24 -20
  [4,16,-40,24,-20,-36,24,-16,36,24,-16,40,24,-20],
// 4 16 40 24 -20 36 24 -16 36 24 16 40 24 20
  [4,16,40,24,-20,36,24,-16,36,24,16,40,24,20],
// 1 16 0 24 0 0 0 40 0 -24 0 -20 0 0 box4.dat
  [1,16,0,24,0,0,0,40,0,-24,0,-20,0,0, ldraw_lib__box4()],
];
module ldraw_lib__s__3001s02(step=0, col=false, unit=2/5, alt=false, line=0.2, solid=!$preview)
    makepoly(ldraw_lib__s__3001s02(), step=step, col=col, unit=unit, alt=alt, line=line, solid=solid);
ldraw_lib__s__3001s02(line=0.2);
// main file
use <../lib.scad>
use <s/3001s02.scad>
use <../p/stud.scad>
function ldraw_lib__65559() = [
// 0 Brick Braille 2 x 4 with 1 Stud (DOTS-5)
// 0 Name: 65559.dat
// 0 Author: Rene Rechthaler [Blechtaler]
// 0 !LDRAW_ORG Part UPDATE 2025-08
// 0 !LICENSE Licensed under CC BY 4.0 : see CAreadme.txt
// 
// 0 BFC CERTIFY CCW
  [0,"BFC","CERTIFY"],
  [0,"BFC","CCW"],
// 
// 0 !KEYWORDS ⠐ Unicode U+2810 (10256), Set 4000503, set 40656
// 
// 0 !HISTORY 2024-08-18 [MagFors] Changed orientation, added keywords
// 0 !HISTORY 2025-08-31 [OrionP] Official Update 2025-08
// 
// 1 16 0 0 0 1 0 0 0 1 0 0 0 1 s\3001s02.dat
  [1,16,0,0,0,1,0,0,0,1,0,0,0,1, ldraw_lib__s__3001s02()],
// 1 16 -10 0 10 1 0 0 0 1 0 0 0 1 stud.dat
  [1,16,-10,0,10,1,0,0,0,1,0,0,0,1, ldraw_lib__stud()],
// 
// 4 16 40 0 -20 40 0 20 -40 0 20 -40 0 -20
  [4,16,40,0,-20,40,0,20,-40,0,20,-40,0,-20],
];
module ldraw_lib__65559(step=0, col=false, unit=2/5, alt=false, line=0.2, solid=!$preview)
    makepoly(ldraw_lib__65559(), step=step, col=col, unit=unit, alt=alt, line=line, solid=solid);
ldraw_lib__65559(line=0.2);
